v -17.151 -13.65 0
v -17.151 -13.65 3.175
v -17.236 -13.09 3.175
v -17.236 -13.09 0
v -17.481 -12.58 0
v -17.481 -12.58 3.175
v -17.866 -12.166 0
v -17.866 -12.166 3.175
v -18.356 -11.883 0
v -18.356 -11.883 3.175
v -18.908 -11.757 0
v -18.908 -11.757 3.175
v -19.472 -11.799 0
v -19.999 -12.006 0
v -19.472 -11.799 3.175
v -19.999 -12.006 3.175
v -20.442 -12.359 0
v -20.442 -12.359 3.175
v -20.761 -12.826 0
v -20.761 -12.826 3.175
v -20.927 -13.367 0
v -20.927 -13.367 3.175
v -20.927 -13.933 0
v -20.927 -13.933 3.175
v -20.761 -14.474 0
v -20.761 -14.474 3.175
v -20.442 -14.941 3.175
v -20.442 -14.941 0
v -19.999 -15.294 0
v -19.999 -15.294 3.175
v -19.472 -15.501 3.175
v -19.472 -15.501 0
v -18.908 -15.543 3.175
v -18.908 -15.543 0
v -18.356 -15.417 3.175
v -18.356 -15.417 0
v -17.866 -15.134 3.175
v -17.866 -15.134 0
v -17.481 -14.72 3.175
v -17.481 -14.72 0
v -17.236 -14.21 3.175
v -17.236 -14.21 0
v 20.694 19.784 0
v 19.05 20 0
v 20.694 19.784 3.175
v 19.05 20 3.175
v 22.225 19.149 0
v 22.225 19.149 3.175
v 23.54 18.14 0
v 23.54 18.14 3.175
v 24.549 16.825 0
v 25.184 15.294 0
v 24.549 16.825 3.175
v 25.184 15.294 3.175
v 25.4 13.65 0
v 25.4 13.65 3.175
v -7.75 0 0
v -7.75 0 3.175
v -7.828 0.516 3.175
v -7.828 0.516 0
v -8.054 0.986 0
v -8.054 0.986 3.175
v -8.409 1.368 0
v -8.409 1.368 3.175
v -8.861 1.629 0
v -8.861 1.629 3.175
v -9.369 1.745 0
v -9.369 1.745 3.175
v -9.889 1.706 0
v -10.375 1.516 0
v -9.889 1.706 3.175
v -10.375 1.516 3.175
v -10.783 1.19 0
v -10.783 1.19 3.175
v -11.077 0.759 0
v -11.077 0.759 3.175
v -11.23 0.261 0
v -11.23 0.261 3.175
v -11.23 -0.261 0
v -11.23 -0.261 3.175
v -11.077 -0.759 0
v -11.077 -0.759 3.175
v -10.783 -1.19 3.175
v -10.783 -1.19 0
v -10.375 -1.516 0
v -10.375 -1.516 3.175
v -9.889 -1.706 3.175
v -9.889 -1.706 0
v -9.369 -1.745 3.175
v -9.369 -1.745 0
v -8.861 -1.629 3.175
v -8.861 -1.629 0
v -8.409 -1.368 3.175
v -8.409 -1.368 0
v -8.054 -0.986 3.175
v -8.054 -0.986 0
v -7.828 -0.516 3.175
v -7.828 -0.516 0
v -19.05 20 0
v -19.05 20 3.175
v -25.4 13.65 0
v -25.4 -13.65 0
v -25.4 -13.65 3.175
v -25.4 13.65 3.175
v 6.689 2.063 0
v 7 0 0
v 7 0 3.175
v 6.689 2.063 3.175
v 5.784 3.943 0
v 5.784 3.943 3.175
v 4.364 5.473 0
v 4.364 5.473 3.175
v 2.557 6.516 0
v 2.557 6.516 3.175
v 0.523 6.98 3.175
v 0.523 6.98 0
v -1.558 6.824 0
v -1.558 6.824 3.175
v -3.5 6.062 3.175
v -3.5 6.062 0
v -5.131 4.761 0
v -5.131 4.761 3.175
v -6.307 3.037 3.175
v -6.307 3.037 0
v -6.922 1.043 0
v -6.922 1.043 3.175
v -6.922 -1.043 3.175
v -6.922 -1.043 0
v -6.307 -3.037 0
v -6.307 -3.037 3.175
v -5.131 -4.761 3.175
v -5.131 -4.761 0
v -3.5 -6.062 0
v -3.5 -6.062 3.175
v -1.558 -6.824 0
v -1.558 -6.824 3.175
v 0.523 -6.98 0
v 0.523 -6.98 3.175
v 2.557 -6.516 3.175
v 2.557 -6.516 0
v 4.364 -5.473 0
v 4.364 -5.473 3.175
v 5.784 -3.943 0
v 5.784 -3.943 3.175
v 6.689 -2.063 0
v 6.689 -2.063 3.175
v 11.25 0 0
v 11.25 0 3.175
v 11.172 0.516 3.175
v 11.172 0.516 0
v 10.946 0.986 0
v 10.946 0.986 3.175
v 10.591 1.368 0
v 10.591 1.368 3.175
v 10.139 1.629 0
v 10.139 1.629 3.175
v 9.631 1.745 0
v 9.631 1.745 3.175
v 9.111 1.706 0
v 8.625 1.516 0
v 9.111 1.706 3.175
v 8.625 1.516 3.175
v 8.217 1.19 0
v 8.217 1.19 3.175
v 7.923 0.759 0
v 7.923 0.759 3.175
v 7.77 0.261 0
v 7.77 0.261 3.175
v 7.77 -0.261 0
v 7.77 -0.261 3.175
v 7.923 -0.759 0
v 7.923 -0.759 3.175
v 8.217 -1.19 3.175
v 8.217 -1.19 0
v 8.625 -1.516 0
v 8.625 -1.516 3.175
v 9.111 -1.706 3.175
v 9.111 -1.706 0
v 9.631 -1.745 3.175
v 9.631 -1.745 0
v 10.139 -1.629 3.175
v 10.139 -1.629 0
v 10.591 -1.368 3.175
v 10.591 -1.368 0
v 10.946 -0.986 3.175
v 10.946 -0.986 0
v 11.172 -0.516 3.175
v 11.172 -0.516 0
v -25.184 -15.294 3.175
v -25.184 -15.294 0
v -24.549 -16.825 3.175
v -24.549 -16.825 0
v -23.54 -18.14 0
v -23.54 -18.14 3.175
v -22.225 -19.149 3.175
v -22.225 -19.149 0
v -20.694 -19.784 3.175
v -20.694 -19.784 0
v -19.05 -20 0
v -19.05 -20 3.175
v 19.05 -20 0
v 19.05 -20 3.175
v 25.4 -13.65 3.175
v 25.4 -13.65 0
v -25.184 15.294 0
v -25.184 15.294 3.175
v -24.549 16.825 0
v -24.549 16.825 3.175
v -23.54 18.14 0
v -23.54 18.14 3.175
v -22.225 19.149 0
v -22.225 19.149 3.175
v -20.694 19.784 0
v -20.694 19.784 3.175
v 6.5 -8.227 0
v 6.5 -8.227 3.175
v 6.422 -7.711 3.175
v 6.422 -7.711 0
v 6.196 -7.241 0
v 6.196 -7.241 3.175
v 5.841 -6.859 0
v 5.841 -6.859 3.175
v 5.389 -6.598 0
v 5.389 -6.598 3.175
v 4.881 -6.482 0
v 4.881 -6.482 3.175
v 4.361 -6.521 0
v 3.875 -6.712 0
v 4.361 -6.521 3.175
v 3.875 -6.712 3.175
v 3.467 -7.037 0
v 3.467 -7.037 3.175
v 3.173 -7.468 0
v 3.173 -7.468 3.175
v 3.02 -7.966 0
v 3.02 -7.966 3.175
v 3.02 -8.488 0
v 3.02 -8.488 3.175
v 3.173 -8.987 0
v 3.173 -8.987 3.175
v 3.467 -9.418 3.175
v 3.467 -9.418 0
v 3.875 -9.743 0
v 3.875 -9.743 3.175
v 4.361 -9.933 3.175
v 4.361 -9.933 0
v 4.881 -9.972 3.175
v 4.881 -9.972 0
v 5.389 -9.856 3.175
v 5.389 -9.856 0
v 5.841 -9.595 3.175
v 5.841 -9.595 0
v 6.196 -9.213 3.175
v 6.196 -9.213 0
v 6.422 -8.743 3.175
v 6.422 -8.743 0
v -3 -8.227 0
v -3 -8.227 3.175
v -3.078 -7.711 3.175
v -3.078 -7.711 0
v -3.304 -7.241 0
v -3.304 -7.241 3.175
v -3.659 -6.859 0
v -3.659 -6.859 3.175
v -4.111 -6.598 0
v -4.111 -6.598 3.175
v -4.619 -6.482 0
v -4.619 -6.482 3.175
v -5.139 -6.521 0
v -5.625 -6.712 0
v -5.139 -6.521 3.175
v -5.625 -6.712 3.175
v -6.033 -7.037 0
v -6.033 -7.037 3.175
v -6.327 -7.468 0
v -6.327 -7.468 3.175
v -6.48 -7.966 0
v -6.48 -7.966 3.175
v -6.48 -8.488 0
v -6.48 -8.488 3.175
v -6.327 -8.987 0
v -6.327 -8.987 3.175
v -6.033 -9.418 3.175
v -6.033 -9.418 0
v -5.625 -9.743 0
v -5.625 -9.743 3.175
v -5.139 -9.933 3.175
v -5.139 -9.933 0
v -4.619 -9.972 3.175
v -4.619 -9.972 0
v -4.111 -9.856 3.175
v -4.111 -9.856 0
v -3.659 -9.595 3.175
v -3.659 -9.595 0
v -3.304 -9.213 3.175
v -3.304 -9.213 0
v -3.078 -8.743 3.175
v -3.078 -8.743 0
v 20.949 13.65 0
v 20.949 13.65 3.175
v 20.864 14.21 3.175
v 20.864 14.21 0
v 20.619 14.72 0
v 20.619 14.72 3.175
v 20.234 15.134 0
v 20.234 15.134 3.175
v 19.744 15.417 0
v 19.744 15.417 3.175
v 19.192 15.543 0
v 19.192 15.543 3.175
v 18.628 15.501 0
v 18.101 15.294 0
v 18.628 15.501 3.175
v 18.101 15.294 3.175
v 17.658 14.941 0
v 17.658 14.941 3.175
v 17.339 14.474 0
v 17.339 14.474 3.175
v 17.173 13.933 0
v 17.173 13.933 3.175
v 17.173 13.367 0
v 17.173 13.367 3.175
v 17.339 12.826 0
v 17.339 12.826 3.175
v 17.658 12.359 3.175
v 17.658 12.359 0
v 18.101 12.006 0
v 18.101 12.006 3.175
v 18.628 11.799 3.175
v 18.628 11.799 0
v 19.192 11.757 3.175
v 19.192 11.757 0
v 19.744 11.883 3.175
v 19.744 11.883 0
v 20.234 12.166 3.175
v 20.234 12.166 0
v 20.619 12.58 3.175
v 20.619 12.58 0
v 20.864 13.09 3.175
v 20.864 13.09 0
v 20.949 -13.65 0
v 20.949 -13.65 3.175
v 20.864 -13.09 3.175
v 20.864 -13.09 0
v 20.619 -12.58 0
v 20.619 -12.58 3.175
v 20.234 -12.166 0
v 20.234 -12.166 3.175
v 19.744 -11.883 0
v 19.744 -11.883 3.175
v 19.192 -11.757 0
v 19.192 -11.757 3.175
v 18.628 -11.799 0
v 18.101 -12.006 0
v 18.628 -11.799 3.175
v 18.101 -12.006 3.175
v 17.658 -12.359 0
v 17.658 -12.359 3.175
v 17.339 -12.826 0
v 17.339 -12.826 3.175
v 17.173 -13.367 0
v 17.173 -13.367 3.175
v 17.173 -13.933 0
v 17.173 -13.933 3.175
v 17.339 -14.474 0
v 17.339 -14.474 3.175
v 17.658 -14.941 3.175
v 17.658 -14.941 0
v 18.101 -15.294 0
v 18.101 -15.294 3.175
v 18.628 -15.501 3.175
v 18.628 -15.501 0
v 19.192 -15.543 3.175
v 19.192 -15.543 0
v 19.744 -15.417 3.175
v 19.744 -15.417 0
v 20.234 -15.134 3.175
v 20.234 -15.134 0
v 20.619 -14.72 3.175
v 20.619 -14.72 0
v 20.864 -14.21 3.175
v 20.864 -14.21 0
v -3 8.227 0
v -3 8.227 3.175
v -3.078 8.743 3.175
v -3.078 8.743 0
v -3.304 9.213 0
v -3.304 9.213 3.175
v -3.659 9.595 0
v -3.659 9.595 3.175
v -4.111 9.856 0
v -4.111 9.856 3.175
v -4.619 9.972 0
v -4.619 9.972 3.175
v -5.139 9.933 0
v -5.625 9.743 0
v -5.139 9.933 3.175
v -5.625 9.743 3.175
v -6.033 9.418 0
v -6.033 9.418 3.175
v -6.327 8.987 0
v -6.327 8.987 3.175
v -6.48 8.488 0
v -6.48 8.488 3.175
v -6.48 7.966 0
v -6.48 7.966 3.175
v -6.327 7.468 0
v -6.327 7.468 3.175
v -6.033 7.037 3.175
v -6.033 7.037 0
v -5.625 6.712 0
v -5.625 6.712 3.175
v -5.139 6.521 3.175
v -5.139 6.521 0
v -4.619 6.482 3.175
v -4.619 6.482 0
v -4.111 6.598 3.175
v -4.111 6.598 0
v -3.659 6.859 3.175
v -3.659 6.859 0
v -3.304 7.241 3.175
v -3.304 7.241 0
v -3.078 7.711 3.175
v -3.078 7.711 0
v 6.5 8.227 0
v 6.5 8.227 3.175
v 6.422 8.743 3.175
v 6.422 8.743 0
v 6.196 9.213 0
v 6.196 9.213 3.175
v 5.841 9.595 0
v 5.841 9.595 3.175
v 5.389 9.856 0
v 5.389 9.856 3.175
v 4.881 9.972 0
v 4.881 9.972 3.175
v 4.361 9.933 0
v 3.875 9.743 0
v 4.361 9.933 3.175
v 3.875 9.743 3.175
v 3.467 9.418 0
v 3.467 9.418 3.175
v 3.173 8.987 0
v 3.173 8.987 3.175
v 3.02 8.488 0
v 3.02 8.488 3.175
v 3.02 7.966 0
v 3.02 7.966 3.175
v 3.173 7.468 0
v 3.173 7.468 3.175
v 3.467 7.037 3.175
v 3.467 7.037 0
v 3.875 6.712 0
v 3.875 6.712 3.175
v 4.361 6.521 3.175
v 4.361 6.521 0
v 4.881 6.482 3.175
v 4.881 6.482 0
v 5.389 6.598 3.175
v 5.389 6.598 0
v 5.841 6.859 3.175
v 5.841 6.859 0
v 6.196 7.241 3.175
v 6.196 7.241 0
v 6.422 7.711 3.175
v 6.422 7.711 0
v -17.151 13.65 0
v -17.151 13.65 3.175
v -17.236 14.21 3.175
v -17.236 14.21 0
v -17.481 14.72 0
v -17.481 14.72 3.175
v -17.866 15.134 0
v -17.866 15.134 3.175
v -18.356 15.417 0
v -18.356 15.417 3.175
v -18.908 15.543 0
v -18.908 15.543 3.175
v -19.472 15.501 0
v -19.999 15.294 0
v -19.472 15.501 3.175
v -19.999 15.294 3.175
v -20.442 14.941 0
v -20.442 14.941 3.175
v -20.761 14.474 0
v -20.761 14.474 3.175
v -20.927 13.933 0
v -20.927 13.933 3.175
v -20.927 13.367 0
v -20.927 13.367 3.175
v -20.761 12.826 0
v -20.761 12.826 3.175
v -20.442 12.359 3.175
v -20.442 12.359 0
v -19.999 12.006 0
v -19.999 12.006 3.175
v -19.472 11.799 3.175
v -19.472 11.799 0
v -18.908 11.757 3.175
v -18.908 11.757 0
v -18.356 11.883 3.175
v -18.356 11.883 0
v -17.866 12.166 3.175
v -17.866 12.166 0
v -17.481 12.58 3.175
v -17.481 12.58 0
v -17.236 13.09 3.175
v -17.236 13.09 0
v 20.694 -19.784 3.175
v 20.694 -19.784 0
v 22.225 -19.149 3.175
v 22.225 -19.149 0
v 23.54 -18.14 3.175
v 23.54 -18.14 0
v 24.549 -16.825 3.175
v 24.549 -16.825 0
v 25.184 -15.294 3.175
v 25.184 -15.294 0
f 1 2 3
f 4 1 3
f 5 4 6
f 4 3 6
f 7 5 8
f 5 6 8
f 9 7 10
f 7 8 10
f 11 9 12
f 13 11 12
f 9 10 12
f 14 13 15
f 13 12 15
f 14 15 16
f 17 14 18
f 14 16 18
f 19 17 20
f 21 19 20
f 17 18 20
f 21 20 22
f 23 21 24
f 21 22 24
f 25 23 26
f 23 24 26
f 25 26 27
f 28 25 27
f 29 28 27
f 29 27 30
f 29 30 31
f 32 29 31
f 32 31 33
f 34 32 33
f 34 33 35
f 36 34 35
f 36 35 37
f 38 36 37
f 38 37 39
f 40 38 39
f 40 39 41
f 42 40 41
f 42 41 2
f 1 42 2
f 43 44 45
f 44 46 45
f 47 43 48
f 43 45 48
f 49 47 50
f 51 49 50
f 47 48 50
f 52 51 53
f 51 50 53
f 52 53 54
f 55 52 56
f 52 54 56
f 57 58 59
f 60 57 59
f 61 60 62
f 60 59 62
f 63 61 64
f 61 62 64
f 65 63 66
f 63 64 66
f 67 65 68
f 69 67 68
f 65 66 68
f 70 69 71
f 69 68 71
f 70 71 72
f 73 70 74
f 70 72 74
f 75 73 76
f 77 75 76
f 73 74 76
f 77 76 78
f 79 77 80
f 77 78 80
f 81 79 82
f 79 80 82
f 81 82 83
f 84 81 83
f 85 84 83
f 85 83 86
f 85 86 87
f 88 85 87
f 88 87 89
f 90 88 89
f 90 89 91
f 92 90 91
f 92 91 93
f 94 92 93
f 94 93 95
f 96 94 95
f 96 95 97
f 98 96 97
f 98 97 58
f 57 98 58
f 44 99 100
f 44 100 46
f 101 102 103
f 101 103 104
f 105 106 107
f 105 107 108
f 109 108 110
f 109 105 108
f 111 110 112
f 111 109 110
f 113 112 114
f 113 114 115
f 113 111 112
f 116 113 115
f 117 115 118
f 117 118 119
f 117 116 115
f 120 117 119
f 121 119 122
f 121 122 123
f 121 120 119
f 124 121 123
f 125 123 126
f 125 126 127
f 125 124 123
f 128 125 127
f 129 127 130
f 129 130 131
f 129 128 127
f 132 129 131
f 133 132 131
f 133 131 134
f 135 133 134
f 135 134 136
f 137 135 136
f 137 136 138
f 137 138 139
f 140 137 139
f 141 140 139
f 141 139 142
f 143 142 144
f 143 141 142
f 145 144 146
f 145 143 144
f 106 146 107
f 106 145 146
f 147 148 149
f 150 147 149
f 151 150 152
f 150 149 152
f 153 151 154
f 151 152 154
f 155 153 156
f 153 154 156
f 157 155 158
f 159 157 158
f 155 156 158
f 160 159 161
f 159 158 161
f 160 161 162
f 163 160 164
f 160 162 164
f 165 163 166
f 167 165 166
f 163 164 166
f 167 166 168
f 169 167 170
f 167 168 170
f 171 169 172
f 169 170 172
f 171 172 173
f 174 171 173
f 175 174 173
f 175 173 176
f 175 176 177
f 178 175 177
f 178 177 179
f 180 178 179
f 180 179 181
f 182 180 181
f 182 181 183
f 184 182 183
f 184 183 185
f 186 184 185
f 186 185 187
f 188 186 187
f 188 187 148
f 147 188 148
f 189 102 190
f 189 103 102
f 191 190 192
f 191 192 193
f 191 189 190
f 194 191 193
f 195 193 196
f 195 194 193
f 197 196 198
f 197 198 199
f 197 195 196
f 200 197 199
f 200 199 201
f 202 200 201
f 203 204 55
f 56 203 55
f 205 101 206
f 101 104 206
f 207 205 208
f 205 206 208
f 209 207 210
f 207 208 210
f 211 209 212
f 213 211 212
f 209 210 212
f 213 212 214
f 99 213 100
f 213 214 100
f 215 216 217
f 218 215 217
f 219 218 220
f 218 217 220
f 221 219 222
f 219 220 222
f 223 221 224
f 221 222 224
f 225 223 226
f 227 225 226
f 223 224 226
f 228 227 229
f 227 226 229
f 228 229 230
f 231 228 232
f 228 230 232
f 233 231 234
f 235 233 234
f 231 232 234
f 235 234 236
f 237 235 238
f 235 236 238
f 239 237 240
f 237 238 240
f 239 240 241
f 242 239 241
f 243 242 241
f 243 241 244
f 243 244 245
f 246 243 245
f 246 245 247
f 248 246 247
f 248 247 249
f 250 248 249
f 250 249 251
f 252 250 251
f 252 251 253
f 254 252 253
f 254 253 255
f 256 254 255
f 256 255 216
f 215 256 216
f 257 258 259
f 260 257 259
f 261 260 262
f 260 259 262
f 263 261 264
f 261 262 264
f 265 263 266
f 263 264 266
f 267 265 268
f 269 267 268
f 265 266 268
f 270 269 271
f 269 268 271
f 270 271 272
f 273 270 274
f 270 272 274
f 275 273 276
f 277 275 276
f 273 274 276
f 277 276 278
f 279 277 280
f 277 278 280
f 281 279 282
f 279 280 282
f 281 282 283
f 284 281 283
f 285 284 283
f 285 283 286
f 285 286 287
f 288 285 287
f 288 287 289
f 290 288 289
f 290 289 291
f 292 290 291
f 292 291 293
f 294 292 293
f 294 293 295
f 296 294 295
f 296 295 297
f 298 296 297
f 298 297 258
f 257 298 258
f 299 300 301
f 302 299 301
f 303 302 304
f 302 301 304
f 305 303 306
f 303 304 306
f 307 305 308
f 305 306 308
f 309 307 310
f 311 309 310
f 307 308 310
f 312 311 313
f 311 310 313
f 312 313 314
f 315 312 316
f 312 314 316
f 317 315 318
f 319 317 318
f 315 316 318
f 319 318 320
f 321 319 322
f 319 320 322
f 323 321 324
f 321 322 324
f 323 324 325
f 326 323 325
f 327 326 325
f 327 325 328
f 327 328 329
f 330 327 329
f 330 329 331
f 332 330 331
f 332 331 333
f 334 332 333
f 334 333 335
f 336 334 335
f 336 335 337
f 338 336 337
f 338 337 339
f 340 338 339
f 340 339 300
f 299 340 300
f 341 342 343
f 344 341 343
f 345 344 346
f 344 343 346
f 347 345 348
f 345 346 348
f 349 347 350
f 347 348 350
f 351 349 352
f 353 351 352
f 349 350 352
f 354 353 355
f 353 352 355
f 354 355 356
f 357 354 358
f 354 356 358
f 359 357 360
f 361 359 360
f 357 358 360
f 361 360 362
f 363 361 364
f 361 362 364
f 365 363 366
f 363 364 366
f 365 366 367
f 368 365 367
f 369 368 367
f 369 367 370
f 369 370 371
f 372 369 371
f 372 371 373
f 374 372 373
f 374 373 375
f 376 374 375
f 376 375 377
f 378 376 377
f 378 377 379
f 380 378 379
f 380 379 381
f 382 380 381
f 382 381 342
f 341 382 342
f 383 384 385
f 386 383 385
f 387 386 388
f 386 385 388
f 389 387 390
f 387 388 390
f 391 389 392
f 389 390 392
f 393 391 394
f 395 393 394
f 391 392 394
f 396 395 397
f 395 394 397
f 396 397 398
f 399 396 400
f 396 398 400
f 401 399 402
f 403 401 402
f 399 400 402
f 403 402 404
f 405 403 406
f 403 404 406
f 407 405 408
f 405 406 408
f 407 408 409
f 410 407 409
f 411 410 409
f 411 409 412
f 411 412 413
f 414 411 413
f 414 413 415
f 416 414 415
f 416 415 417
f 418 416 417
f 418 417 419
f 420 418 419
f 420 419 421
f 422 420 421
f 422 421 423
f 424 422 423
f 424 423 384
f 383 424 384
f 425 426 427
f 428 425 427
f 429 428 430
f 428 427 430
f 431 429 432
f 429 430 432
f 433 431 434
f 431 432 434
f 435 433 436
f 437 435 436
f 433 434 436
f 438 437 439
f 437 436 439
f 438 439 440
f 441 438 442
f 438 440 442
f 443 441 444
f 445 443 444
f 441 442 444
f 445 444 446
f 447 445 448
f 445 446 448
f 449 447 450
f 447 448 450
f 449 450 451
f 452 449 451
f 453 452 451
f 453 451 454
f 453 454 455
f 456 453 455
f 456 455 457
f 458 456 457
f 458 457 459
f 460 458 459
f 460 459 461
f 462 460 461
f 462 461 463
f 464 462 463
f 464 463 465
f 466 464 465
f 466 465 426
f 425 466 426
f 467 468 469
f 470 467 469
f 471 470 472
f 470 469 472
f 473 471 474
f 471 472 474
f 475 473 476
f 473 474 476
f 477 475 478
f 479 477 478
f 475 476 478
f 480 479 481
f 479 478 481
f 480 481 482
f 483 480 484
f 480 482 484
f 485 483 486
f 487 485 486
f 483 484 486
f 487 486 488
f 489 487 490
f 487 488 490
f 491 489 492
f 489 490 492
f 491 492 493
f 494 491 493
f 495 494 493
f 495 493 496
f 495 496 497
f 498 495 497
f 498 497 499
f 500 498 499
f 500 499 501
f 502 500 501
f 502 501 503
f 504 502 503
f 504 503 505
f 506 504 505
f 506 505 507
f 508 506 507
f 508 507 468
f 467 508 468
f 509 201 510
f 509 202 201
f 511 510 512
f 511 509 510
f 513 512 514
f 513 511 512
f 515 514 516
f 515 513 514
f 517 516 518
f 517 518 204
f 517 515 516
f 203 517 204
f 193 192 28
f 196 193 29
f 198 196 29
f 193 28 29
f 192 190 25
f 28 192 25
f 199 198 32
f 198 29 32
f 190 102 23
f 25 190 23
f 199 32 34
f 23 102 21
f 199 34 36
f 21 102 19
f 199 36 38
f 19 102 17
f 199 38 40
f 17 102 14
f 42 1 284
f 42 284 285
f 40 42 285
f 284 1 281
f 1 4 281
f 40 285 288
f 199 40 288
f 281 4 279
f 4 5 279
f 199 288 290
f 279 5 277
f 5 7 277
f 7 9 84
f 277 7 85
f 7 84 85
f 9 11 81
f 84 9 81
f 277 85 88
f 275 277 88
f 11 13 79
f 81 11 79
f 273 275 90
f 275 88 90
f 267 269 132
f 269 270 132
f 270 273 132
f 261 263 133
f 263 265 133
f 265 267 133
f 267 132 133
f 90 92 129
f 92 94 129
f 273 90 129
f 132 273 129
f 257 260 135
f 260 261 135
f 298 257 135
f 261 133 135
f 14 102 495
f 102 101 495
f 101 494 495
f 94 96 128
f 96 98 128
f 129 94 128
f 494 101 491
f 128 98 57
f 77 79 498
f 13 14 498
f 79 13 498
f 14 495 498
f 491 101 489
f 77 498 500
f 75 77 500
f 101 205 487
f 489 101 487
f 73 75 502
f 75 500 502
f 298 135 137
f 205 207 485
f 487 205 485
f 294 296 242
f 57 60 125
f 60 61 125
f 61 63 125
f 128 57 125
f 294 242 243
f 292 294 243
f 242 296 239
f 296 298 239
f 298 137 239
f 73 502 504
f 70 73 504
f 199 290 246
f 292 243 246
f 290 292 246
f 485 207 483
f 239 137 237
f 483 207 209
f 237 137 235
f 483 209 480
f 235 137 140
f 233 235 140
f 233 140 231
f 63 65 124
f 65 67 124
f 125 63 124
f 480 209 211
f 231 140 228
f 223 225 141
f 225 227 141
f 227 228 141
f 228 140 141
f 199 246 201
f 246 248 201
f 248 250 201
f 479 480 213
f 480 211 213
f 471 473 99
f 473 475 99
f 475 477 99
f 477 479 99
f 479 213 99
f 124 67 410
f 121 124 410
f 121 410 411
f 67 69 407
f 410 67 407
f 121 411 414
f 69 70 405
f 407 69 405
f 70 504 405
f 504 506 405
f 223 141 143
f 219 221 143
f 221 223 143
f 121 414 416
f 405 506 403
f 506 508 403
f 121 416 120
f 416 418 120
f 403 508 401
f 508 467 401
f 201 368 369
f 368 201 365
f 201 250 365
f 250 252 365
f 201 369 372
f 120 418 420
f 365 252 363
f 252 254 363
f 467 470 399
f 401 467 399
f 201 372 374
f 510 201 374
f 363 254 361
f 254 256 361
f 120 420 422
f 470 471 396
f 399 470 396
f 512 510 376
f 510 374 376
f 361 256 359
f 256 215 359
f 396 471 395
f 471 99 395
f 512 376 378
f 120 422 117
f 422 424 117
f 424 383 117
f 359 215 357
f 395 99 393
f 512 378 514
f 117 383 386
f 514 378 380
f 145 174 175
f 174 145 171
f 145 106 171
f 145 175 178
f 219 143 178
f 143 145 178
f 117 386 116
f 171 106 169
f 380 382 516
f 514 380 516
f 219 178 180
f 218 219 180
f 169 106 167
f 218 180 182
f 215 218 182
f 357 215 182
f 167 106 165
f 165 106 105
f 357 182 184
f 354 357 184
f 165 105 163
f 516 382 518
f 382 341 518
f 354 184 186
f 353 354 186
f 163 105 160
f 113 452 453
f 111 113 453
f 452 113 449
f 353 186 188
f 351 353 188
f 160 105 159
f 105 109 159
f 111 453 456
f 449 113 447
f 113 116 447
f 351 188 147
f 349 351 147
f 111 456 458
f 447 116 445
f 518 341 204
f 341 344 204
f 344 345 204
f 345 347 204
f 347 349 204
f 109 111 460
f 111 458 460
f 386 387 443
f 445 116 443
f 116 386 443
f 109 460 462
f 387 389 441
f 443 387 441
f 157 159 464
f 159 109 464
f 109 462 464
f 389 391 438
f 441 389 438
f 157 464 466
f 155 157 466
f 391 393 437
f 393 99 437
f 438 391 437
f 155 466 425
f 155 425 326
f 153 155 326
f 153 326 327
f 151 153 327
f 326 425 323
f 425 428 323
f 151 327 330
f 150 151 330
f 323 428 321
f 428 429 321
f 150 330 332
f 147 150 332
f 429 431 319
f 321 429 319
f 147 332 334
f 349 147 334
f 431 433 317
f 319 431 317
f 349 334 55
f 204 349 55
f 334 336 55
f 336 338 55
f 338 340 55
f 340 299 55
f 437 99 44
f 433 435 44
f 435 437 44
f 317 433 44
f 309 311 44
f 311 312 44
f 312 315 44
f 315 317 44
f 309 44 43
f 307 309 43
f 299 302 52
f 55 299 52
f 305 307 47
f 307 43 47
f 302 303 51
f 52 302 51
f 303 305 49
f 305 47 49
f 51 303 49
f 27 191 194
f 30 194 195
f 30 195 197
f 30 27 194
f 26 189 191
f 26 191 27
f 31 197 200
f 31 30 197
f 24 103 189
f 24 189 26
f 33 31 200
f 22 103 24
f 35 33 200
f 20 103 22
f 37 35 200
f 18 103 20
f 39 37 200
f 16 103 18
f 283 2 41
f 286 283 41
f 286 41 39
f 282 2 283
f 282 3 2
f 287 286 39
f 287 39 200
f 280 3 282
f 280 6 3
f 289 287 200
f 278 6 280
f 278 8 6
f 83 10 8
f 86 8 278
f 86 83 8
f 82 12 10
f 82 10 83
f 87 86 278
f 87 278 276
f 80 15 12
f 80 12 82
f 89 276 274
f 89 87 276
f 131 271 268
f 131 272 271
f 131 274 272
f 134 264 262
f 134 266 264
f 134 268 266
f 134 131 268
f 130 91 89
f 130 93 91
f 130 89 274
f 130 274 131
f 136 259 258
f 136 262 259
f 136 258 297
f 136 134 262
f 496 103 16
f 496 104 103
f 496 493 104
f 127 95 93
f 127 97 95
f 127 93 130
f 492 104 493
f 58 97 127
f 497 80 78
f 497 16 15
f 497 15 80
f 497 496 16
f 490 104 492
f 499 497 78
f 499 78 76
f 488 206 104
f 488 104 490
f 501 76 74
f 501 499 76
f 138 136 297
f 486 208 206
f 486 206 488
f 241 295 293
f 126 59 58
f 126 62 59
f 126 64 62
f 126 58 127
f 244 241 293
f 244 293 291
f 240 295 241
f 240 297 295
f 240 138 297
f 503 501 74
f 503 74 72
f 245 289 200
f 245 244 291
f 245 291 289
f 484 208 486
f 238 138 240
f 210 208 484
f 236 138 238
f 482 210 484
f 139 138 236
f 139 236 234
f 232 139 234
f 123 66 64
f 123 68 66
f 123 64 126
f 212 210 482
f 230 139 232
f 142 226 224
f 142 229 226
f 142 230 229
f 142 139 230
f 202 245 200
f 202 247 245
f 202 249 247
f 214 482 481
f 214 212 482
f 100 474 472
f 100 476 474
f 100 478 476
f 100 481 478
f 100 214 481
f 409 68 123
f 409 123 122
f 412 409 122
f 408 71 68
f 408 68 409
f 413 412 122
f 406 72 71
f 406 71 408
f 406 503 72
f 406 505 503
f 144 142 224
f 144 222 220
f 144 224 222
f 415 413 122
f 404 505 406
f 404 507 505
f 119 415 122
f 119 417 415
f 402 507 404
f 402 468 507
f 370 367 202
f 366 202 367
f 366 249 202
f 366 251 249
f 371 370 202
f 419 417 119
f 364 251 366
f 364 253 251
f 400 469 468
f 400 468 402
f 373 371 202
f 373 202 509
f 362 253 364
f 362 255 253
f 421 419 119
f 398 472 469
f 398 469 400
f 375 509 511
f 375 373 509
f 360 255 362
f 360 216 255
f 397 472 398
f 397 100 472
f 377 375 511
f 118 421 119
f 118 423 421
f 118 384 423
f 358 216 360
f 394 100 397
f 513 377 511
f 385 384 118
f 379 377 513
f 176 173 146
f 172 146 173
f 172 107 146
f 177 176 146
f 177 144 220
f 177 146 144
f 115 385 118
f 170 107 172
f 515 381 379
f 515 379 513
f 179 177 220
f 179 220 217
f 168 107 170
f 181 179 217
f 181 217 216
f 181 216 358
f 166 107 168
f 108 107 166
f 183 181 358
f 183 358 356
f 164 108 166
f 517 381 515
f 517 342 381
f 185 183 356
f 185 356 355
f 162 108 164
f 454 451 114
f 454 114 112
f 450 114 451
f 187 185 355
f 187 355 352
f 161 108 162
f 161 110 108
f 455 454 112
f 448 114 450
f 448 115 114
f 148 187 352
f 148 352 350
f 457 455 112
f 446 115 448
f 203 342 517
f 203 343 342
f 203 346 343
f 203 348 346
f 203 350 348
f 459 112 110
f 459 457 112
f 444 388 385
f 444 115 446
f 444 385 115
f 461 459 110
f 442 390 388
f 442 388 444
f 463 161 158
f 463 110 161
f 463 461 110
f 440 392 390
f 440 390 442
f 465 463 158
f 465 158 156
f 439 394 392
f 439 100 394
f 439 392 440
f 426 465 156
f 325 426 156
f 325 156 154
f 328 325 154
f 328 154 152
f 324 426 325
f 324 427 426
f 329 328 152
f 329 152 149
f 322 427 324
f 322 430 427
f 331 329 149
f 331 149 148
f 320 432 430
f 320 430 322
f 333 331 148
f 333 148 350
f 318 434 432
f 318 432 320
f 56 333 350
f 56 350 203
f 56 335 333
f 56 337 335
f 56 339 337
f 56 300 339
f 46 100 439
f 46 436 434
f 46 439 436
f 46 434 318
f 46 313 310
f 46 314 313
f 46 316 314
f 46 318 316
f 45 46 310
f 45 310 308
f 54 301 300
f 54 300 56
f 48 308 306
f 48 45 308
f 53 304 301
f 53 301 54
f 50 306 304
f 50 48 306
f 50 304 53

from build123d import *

# Parameters (mm, degrees)
SKETCH1_W           = 50.8
SKETCH1_H           = 40
SKETCH1_R           = 7
BOSS_EXTRUDE1_DEPTH = 3.175
FILLET1_R           = 6.35
SKETCH9_R           = 1.75
M3_THROUGH_DEPTH    = 4.175
SKETCH10_R          = 1.89865
CUT_EXTRUDE2_DEPTH  = 4.175


with BuildPart() as part:
    # Sketch1 → Boss-Extrude1 (new body)
    with BuildSketch(Plane.XY):
        Rectangle(SKETCH1_W, SKETCH1_H)
        Circle(SKETCH1_R, mode=Mode.SUBTRACT)
    extrude(amount=BOSS_EXTRUDE1_DEPTH)

    # Fillet1
    fillet1_edges = [part.edges().sort_by_distance(p)[0] for p in [
        (-25.4, 20, 1.5875),
        (25.4, 20, 1.5875),
        (25.4, -20, 1.5875),
        (-25.4, -20, 1.5875),
    ]]
    fillet(fillet1_edges, radius=FILLET1_R)

    # Sketch9 → M3-through (cut, through all)
    with BuildSketch(Plane.XY.offset(3.175)):
        with Locations((9.5, 0)):
            Circle(SKETCH9_R)
        with Locations((4.75, -8.227241336)):
            Circle(SKETCH9_R)
        with Locations((-4.75, -8.227241336)):
            Circle(SKETCH9_R)
        with Locations((-9.5, 0)):
            Circle(SKETCH9_R)
        with Locations((-4.75, 8.227241336)):
            Circle(SKETCH9_R)
        with Locations((4.75, 8.227241336)):
            Circle(SKETCH9_R)
    extrude(amount=-M3_THROUGH_DEPTH, mode=Mode.SUBTRACT)

    # Sketch10 → Cut-Extrude2 (cut, through all)
    with BuildSketch(Plane.XY.offset(3.175)):
        with Locations((19.05, -13.65)):
            Circle(SKETCH10_R)
        with Locations((19.05, 13.65)):
            Circle(SKETCH10_R)
        with Locations((-19.05, -13.65)):
            Circle(SKETCH10_R)
        with Locations((-19.05, 13.65)):
            Circle(SKETCH10_R)
    extrude(amount=-CUT_EXTRUDE2_DEPTH, mode=Mode.SUBTRACT)


solid = part.part
